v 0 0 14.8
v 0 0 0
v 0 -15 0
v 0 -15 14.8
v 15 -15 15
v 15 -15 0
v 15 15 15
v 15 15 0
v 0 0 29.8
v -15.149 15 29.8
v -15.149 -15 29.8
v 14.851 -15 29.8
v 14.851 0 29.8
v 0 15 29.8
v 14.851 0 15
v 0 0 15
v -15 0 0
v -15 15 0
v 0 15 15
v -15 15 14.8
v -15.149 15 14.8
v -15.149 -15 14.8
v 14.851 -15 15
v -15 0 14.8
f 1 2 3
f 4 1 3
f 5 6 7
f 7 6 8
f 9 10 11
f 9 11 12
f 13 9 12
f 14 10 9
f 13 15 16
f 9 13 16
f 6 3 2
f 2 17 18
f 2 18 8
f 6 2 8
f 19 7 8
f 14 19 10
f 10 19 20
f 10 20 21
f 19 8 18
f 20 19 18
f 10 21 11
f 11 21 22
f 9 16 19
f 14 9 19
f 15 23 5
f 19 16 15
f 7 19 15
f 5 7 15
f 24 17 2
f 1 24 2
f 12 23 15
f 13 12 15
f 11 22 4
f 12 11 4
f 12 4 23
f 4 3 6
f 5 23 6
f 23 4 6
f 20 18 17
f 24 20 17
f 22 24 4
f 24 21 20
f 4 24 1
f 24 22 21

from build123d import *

# Parameters (mm, degrees)
F1_DEPTH = 15
F4_DEPTH = 15


with BuildPart() as f1:
    # F0 (on Top) → F1 (new body)
    with BuildSketch(Plane.XY):
        Polygon((-15, 0), (0, 0), (0, -15), (15, -15), (15, 15), (-15, 15), align=None)
    extrude(amount=F1_DEPTH)

    # F3 (on offset) → F4 (join)
    with BuildSketch(Plane.XY.offset(14.8)):
        Polygon((14.851485, 0), (0, 0), (0, 15), (-15.148515, 15), (-15.148515, -15), (14.851485, -15), align=None)
    extrude(amount=F4_DEPTH)


solid = f1.part
